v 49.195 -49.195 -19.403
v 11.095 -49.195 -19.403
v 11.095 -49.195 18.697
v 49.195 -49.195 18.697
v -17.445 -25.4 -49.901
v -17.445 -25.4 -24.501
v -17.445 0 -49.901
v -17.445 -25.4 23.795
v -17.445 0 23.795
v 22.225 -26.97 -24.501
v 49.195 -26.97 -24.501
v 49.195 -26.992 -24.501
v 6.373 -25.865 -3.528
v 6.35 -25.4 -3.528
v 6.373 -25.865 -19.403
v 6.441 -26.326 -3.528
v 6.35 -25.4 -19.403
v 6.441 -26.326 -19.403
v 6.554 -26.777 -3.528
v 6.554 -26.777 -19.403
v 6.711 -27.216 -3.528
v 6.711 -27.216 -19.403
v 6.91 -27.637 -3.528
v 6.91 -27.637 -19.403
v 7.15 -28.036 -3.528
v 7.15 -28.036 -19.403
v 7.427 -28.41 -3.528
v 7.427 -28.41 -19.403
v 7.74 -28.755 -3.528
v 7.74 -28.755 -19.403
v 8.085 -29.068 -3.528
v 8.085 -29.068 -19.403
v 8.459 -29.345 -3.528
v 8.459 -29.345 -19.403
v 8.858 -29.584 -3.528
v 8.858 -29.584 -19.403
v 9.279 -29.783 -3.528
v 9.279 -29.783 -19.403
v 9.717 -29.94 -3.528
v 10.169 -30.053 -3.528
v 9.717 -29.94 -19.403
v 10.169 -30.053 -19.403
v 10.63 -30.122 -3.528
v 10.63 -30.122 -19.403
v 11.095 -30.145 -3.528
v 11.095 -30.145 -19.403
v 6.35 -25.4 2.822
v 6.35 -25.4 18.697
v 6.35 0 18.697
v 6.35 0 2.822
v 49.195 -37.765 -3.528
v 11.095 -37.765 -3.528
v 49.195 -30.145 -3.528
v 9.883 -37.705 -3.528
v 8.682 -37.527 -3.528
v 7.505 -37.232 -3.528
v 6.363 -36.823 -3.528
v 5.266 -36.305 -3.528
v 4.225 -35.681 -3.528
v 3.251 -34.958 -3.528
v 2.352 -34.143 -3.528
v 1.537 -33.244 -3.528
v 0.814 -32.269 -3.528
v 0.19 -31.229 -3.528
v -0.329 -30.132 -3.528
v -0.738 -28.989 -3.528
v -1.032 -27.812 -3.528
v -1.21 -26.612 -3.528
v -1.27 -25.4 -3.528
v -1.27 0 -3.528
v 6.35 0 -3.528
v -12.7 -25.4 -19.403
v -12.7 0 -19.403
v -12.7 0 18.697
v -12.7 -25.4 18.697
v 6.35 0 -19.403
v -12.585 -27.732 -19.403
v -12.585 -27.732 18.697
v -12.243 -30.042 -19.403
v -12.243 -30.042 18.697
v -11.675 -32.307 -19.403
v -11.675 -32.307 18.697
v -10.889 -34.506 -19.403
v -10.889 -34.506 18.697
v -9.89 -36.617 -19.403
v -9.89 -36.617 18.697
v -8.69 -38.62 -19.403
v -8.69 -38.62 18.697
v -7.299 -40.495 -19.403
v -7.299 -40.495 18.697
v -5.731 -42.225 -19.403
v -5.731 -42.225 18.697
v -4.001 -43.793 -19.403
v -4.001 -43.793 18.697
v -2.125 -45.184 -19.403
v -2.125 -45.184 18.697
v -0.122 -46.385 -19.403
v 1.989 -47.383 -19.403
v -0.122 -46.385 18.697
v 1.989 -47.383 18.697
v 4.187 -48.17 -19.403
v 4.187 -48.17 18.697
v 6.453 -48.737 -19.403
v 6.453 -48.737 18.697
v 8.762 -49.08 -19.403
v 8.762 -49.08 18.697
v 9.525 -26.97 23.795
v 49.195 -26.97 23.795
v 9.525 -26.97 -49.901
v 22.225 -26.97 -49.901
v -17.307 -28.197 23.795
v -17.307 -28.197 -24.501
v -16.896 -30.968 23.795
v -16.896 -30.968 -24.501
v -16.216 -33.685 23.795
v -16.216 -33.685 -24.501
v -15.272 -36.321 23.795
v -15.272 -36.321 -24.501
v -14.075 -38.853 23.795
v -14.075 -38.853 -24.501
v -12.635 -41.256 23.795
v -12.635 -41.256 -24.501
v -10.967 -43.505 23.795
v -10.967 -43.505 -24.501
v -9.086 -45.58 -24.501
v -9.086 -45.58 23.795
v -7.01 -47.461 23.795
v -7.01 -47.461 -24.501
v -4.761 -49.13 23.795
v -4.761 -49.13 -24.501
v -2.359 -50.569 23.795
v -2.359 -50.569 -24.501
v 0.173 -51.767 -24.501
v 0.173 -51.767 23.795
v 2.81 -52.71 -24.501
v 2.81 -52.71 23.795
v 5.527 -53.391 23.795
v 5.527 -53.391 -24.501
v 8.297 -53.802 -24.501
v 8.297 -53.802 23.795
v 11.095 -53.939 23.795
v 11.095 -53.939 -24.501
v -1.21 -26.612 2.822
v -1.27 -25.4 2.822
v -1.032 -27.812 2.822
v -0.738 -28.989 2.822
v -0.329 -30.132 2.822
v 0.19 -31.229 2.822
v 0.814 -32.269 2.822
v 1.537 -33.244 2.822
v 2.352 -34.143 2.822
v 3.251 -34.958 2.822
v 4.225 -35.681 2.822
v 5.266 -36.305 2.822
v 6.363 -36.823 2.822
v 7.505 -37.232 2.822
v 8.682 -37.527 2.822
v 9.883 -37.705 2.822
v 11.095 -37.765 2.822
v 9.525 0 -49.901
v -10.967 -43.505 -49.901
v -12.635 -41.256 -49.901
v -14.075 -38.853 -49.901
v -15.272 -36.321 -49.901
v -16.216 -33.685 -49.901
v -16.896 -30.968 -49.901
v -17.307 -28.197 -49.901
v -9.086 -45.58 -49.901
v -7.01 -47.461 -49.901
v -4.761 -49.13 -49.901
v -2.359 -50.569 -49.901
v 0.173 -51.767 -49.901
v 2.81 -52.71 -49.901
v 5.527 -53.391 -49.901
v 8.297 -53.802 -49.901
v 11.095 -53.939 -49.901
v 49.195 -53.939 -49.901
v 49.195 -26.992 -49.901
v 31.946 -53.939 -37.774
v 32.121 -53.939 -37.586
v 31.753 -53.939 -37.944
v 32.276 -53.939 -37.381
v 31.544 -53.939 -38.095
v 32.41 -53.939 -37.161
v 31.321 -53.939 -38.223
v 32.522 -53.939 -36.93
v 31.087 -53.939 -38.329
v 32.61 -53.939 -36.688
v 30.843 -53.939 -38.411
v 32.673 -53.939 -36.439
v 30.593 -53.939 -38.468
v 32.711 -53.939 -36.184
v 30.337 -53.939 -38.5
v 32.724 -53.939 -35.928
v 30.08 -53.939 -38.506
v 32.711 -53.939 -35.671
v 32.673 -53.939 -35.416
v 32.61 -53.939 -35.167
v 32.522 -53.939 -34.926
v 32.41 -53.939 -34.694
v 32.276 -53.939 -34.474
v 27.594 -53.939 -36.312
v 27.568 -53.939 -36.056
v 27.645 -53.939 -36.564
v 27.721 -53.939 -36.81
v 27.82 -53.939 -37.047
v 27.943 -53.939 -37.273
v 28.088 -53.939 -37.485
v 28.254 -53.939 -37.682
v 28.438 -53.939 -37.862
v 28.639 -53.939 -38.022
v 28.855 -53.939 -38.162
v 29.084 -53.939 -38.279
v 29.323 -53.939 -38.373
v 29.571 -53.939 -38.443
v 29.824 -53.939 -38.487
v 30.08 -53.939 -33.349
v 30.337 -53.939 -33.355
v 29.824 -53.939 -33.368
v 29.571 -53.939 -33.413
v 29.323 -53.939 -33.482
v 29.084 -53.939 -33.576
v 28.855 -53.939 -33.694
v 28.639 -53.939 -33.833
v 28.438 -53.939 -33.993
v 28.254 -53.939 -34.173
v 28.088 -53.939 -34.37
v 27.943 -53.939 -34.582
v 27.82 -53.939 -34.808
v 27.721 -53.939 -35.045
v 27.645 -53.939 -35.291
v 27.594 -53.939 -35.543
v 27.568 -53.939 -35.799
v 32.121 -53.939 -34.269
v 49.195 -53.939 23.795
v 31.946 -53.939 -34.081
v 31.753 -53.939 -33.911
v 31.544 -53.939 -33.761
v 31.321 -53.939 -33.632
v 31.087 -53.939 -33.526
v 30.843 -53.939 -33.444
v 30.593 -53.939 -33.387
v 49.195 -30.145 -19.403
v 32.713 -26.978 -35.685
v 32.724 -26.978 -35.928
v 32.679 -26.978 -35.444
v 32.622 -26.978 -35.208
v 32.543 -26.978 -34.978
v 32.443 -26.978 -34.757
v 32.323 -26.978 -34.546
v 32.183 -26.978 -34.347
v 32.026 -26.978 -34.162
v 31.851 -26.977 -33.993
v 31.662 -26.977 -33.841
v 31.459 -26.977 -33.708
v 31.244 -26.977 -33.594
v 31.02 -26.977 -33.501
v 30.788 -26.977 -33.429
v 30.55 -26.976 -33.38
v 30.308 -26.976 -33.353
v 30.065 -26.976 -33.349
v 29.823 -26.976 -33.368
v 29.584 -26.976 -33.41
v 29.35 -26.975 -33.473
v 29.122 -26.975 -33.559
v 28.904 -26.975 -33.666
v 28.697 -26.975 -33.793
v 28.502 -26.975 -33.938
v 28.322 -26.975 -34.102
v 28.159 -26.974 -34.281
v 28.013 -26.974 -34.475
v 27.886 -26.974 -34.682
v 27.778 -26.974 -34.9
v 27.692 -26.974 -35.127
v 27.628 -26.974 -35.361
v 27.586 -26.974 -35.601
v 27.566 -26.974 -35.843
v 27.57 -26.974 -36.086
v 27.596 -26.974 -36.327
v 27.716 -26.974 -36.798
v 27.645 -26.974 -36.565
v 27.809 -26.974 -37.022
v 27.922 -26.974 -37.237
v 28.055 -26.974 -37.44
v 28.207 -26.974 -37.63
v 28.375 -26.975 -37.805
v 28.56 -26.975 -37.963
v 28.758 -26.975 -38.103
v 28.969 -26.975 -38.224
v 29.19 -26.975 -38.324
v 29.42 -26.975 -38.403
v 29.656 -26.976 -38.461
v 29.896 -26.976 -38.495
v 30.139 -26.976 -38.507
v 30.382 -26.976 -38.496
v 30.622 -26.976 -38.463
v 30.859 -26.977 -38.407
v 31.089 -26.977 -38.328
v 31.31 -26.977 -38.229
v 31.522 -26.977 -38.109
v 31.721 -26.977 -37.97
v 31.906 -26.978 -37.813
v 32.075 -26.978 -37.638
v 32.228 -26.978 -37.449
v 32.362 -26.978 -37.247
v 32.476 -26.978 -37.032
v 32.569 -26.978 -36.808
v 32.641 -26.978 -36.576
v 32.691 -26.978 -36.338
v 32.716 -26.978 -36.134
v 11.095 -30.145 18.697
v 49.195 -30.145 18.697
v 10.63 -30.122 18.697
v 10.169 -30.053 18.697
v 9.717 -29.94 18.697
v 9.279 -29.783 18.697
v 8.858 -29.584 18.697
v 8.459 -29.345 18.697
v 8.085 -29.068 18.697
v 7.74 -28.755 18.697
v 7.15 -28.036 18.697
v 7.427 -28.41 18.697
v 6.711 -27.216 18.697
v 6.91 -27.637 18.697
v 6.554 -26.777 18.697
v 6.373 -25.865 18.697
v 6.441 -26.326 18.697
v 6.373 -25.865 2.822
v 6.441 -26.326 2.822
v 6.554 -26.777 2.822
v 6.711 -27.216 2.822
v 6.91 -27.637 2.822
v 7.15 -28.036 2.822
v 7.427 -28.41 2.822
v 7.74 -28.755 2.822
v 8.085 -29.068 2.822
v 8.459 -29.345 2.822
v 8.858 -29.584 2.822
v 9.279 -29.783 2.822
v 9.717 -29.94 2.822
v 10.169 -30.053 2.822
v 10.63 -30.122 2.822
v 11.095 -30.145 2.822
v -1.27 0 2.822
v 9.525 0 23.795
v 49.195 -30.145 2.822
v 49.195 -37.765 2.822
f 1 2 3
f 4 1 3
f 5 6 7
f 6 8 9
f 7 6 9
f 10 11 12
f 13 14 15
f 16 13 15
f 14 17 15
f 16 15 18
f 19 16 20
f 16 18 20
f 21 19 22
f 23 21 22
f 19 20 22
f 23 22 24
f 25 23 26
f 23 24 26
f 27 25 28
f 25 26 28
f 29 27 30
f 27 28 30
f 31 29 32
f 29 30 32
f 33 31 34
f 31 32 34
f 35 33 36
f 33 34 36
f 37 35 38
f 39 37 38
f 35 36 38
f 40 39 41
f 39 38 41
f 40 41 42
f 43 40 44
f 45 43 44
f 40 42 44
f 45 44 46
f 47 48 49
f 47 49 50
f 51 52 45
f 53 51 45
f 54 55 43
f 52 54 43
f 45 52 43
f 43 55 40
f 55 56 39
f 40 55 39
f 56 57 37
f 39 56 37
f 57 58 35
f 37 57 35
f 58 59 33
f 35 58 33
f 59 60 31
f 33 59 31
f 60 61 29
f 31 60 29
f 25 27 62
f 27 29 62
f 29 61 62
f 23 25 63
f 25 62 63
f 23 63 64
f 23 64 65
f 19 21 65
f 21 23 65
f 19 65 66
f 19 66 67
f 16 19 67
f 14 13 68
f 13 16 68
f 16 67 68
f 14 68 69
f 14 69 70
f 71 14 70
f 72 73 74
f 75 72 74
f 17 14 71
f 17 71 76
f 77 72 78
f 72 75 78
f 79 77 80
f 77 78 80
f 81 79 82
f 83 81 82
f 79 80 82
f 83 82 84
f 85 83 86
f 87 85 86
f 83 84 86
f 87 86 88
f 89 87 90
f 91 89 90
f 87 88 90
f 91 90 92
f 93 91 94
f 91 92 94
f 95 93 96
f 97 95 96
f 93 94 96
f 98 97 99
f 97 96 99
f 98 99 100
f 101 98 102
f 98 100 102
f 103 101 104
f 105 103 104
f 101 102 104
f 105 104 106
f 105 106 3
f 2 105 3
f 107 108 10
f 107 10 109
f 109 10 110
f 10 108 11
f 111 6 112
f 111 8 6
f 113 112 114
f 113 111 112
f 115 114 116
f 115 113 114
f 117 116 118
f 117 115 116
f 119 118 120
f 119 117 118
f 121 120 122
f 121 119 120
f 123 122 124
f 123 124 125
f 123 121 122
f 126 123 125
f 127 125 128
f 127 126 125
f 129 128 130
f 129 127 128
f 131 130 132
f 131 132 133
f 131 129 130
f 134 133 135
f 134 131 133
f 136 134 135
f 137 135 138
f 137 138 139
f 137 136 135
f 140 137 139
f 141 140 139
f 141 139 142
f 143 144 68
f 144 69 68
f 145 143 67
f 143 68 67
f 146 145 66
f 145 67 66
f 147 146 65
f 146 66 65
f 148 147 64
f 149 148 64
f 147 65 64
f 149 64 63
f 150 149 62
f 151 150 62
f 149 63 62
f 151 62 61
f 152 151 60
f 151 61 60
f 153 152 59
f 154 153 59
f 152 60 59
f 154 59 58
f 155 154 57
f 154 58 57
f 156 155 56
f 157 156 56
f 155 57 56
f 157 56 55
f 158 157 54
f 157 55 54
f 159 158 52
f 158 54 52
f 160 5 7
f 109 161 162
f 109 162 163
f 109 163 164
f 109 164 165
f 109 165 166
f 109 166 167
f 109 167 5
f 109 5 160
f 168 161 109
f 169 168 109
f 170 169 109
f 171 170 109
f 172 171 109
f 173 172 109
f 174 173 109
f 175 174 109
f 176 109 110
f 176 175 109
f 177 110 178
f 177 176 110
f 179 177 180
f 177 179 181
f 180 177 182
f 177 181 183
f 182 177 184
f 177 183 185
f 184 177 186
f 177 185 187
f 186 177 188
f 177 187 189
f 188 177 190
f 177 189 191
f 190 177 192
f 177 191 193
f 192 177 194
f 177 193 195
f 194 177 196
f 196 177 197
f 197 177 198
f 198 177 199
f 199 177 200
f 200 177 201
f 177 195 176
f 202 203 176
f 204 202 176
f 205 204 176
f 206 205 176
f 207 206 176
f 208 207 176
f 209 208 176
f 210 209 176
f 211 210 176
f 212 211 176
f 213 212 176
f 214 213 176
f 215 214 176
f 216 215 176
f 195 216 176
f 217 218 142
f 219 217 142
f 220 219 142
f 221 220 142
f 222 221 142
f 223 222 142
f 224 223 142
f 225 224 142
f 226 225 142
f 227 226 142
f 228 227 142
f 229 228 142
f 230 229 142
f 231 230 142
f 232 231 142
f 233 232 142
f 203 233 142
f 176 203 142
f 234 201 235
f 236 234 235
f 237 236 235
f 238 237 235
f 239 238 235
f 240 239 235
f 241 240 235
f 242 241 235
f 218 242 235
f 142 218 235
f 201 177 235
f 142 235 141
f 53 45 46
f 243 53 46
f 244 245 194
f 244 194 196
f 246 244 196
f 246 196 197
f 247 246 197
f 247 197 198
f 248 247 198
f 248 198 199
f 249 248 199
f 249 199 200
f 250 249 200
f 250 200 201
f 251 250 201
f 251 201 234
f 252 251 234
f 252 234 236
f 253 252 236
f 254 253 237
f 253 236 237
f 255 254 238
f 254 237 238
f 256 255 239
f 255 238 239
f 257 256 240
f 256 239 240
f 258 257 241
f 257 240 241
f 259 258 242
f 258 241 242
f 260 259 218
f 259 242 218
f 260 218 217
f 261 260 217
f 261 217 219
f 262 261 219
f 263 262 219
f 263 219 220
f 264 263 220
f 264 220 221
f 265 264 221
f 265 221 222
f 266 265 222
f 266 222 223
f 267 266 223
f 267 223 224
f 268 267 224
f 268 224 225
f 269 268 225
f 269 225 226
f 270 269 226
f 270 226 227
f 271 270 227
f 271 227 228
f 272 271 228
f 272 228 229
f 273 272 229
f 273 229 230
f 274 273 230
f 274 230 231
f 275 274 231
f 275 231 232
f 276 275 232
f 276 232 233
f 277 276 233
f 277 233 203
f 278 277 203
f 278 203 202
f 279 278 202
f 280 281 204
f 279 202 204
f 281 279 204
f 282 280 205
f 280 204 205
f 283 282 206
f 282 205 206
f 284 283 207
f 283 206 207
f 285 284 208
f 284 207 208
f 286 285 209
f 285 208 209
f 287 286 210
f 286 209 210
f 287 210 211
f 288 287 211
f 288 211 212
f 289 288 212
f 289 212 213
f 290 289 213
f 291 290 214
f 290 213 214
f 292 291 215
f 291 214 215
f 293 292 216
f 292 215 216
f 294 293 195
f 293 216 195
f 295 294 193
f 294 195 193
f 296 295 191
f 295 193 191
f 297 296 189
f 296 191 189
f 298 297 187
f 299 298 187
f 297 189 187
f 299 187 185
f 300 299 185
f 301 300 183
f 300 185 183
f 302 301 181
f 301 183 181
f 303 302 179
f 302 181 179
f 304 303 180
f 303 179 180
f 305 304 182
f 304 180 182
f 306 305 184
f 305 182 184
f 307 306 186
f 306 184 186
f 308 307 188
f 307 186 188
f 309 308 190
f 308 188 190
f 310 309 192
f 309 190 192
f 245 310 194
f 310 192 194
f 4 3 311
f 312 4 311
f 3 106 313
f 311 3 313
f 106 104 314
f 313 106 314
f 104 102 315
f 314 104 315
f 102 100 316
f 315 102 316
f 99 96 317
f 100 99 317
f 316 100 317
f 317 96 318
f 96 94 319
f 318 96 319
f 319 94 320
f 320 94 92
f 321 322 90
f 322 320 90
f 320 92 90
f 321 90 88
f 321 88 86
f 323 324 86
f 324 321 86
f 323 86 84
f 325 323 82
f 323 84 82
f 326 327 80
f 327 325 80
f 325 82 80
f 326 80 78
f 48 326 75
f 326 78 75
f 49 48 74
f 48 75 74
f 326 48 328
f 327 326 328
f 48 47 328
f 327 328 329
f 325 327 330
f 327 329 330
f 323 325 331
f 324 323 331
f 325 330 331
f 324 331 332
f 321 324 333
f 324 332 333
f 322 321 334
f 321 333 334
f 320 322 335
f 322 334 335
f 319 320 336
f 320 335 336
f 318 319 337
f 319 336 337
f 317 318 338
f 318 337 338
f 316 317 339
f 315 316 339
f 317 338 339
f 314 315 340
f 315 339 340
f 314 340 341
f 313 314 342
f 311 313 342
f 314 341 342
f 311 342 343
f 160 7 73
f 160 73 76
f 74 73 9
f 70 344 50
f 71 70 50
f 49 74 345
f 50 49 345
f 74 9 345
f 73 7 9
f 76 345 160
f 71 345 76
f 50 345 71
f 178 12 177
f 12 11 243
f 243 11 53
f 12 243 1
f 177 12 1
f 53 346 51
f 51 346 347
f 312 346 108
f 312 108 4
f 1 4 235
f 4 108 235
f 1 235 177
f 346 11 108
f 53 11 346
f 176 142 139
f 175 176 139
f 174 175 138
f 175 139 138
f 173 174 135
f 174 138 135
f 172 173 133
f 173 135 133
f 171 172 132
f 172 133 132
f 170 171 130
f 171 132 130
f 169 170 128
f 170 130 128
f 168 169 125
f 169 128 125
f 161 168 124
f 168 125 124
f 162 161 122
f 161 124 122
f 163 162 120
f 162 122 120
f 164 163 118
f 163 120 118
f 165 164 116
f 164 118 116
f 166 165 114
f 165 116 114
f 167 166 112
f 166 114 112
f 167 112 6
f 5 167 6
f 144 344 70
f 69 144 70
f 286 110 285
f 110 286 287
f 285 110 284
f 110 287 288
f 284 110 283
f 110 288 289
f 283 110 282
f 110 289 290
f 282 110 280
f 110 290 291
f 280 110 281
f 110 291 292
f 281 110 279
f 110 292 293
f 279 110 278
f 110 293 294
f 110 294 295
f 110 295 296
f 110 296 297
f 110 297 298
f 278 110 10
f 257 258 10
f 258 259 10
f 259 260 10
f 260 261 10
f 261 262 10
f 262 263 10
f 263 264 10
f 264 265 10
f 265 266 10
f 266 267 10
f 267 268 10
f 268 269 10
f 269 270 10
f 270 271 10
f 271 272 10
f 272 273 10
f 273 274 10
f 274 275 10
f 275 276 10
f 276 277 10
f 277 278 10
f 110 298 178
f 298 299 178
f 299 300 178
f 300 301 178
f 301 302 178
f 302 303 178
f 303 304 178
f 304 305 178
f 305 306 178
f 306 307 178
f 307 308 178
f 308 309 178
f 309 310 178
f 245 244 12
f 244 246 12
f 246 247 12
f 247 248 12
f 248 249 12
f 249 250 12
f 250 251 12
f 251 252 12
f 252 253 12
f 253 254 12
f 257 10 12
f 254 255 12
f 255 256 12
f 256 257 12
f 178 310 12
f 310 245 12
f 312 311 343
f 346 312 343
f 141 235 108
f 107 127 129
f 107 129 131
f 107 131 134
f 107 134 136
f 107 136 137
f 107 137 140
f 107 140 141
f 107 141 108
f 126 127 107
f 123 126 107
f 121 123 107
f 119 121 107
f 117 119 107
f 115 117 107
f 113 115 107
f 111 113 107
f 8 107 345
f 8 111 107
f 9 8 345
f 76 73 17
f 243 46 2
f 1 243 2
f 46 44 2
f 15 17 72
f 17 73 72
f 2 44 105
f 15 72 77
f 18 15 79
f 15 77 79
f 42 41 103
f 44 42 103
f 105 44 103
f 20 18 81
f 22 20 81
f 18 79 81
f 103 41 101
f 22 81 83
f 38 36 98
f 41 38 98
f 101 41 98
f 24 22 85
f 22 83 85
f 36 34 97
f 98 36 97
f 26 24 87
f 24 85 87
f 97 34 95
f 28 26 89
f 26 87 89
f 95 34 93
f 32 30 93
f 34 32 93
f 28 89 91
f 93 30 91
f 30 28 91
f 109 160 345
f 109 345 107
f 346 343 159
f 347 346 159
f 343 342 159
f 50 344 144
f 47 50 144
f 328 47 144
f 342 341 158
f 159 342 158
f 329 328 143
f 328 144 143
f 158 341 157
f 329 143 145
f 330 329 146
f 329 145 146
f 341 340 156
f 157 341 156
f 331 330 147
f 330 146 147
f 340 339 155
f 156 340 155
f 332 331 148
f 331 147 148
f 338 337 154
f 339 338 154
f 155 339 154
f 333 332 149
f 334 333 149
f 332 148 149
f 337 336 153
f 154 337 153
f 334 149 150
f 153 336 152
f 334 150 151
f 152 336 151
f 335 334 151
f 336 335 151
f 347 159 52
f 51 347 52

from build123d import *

# Parameters (mm, degrees)
F0_W      = 28.5392315894
F0_H      = 48.2956362042
F1_DEPTH  = 25.4
F1_FACE_W = 28.5392315894
F1_FACE_H = 48.2956362042
F2_ANGLE  = 90
F3_DEPTH  = 38.1
F4_W      = 26.9696157947
F4_H      = 26.9696157947
F5_DEPTH  = 50.14334
F6_W      = 26.9748
F6_H      = 6.35
F7_DEPTH  = 25.4
F9_DEPTH  = 38.1
F11_DEPTH = 12.7


with BuildPart() as f1:
    # F0 (on Front) → F1 (new body)
    with BuildSketch(Plane.XZ):
        with Locations((-3.175, -0.3527777778)):
            Rectangle(F0_W, F0_H)
        Polygon((-12.7, -19.4027777778), (-12.7, 18.6972222222), (6.35, 18.6972222222), (6.35, 2.8222222222), (-1.27, 2.8222222222), (-1.27, -3.5277777778), (6.35, -3.5277777778), (6.35, -19.4027777778), align=None, mode=Mode.SUBTRACT)
    extrude(amount=F1_DEPTH)

    # F1_face (on face) → F2 (revolve)
    with BuildSketch(Plane(origin=(-2.7804632911, -25.4, -0.3527777778), x_dir=(1, 0, 0), z_dir=(0, -1, 0))):
        with Locations((-0.3945367089, 0)):
            Rectangle(F1_FACE_W, F1_FACE_H)
        Polygon((9.1304632911, -19.05), (-9.9195367089, -19.05), (-9.9195367089, 19.05), (9.1304632911, 19.05), (9.1304632911, 3.175), (1.5104632911, 3.175), (1.5104632911, -3.175), (9.1304632911, -3.175), align=None, mode=Mode.SUBTRACT)
    revolve(axis=Axis((11.0946157947, -25.4, -0.3527777778), (0, 0, 1)), revolution_arc=F2_ANGLE)

    # F3 (add): a face of the model
    f3_faces = [f1.faces().sort_by_distance(p)[0] for p in [
        (11.0946157947, -22.3630131274, -0.3527777778),
    ]]
    extrude(f3_faces, amount=F3_DEPTH)

    # F4 (on face) → F5 (cut, symmetric)
    with BuildSketch(Plane(origin=(0, 0, -24.5005958799), x_dir=(1, 0, 0), z_dir=(0, 0, -1))):
        with Locations((35.7098078974, 13.4848078974)):
            Rectangle(F4_W, F4_H)
    extrude(amount=F5_DEPTH, both=True, mode=Mode.SUBTRACT)

    # F6 (on face) → F7 (join)
    with BuildSketch(Plane(origin=(0, 0, -24.5005958799), x_dir=(1, 0, 0), z_dir=(0, 0, -1))):
        Polygon((22.2198247534, 33.3196136858), (22.225, 26.9696157947), (49.1946157947, 26.9915960246), (49.1946157947, 33.3415981335), align=None)
        with Locations((35.7072157947, 50.7642315894)):
            Rectangle(F6_W, F6_H)
        with BuildLine():
            Line((22.225, 0), (22.225, 26.9696157947))
            Line((22.225, 26.9696157947), (22.2198247534, 33.3196136858))
            Line((22.2198247534, 33.3196136858), (49.1946157947, 33.3415981335))
            Line((49.1946157947, 33.3415981335), (49.1946157947, 47.5892315894))
            Line((49.1946157947, 47.5892315894), (22.2198157947, 47.5892315894))
            Line((22.2198157947, 47.5892315894), (22.2198157947, 53.9392315894))
            Line((22.2198157947, 53.9392315894), (11.0946157947, 53.9392315894))
            ThreePointArc((11.0946157947, 53.9392315894), (-9.085668392, 45.5802841867), (-17.4446157947, 25.4))
            Line((-17.4446157947, 25.4), (-17.4446157947, 0))
            Line((-17.4446157947, 0), (22.225, 0))
        make_face()
    extrude(amount=F7_DEPTH)

    # F8 (on face) → F9 (cut)
    with BuildSketch(Plane.XZ.offset(53.9392315894)):
        with BuildLine():
            ThreePointArc((27.5649282947, -35.9276048839), (30.1446157947, -38.5072923839), (32.7243032947, -35.9276048839))
            Line((32.7243032947, -35.9276048839), (30.1446157947, -35.9276048839))
            Line((30.1446157947, -35.9276048839), (27.5649282947, -35.9276048839))
        make_face()
        with BuildLine():
            Line((30.1446157947, -35.9276048839), (32.7243032947, -35.9276048839))
            ThreePointArc((32.7243032947, -35.9276048839), (30.1446157947, -33.3479173839), (27.5649282947, -35.9276048839))
            Line((27.5649282947, -35.9276048839), (30.1446157947, -35.9276048839))
        make_face()
    extrude(amount=-F9_DEPTH, mode=Mode.SUBTRACT)

    # F11 (cut): a face of the model
    f11_faces = [f1.faces().sort_by_distance(p)[0] for p in [
        (22.225, -13.4848078974, -13.0527777778),
    ]]
    extrude(f11_faces, amount=-F11_DEPTH, mode=Mode.SUBTRACT)


solid = f1.part
